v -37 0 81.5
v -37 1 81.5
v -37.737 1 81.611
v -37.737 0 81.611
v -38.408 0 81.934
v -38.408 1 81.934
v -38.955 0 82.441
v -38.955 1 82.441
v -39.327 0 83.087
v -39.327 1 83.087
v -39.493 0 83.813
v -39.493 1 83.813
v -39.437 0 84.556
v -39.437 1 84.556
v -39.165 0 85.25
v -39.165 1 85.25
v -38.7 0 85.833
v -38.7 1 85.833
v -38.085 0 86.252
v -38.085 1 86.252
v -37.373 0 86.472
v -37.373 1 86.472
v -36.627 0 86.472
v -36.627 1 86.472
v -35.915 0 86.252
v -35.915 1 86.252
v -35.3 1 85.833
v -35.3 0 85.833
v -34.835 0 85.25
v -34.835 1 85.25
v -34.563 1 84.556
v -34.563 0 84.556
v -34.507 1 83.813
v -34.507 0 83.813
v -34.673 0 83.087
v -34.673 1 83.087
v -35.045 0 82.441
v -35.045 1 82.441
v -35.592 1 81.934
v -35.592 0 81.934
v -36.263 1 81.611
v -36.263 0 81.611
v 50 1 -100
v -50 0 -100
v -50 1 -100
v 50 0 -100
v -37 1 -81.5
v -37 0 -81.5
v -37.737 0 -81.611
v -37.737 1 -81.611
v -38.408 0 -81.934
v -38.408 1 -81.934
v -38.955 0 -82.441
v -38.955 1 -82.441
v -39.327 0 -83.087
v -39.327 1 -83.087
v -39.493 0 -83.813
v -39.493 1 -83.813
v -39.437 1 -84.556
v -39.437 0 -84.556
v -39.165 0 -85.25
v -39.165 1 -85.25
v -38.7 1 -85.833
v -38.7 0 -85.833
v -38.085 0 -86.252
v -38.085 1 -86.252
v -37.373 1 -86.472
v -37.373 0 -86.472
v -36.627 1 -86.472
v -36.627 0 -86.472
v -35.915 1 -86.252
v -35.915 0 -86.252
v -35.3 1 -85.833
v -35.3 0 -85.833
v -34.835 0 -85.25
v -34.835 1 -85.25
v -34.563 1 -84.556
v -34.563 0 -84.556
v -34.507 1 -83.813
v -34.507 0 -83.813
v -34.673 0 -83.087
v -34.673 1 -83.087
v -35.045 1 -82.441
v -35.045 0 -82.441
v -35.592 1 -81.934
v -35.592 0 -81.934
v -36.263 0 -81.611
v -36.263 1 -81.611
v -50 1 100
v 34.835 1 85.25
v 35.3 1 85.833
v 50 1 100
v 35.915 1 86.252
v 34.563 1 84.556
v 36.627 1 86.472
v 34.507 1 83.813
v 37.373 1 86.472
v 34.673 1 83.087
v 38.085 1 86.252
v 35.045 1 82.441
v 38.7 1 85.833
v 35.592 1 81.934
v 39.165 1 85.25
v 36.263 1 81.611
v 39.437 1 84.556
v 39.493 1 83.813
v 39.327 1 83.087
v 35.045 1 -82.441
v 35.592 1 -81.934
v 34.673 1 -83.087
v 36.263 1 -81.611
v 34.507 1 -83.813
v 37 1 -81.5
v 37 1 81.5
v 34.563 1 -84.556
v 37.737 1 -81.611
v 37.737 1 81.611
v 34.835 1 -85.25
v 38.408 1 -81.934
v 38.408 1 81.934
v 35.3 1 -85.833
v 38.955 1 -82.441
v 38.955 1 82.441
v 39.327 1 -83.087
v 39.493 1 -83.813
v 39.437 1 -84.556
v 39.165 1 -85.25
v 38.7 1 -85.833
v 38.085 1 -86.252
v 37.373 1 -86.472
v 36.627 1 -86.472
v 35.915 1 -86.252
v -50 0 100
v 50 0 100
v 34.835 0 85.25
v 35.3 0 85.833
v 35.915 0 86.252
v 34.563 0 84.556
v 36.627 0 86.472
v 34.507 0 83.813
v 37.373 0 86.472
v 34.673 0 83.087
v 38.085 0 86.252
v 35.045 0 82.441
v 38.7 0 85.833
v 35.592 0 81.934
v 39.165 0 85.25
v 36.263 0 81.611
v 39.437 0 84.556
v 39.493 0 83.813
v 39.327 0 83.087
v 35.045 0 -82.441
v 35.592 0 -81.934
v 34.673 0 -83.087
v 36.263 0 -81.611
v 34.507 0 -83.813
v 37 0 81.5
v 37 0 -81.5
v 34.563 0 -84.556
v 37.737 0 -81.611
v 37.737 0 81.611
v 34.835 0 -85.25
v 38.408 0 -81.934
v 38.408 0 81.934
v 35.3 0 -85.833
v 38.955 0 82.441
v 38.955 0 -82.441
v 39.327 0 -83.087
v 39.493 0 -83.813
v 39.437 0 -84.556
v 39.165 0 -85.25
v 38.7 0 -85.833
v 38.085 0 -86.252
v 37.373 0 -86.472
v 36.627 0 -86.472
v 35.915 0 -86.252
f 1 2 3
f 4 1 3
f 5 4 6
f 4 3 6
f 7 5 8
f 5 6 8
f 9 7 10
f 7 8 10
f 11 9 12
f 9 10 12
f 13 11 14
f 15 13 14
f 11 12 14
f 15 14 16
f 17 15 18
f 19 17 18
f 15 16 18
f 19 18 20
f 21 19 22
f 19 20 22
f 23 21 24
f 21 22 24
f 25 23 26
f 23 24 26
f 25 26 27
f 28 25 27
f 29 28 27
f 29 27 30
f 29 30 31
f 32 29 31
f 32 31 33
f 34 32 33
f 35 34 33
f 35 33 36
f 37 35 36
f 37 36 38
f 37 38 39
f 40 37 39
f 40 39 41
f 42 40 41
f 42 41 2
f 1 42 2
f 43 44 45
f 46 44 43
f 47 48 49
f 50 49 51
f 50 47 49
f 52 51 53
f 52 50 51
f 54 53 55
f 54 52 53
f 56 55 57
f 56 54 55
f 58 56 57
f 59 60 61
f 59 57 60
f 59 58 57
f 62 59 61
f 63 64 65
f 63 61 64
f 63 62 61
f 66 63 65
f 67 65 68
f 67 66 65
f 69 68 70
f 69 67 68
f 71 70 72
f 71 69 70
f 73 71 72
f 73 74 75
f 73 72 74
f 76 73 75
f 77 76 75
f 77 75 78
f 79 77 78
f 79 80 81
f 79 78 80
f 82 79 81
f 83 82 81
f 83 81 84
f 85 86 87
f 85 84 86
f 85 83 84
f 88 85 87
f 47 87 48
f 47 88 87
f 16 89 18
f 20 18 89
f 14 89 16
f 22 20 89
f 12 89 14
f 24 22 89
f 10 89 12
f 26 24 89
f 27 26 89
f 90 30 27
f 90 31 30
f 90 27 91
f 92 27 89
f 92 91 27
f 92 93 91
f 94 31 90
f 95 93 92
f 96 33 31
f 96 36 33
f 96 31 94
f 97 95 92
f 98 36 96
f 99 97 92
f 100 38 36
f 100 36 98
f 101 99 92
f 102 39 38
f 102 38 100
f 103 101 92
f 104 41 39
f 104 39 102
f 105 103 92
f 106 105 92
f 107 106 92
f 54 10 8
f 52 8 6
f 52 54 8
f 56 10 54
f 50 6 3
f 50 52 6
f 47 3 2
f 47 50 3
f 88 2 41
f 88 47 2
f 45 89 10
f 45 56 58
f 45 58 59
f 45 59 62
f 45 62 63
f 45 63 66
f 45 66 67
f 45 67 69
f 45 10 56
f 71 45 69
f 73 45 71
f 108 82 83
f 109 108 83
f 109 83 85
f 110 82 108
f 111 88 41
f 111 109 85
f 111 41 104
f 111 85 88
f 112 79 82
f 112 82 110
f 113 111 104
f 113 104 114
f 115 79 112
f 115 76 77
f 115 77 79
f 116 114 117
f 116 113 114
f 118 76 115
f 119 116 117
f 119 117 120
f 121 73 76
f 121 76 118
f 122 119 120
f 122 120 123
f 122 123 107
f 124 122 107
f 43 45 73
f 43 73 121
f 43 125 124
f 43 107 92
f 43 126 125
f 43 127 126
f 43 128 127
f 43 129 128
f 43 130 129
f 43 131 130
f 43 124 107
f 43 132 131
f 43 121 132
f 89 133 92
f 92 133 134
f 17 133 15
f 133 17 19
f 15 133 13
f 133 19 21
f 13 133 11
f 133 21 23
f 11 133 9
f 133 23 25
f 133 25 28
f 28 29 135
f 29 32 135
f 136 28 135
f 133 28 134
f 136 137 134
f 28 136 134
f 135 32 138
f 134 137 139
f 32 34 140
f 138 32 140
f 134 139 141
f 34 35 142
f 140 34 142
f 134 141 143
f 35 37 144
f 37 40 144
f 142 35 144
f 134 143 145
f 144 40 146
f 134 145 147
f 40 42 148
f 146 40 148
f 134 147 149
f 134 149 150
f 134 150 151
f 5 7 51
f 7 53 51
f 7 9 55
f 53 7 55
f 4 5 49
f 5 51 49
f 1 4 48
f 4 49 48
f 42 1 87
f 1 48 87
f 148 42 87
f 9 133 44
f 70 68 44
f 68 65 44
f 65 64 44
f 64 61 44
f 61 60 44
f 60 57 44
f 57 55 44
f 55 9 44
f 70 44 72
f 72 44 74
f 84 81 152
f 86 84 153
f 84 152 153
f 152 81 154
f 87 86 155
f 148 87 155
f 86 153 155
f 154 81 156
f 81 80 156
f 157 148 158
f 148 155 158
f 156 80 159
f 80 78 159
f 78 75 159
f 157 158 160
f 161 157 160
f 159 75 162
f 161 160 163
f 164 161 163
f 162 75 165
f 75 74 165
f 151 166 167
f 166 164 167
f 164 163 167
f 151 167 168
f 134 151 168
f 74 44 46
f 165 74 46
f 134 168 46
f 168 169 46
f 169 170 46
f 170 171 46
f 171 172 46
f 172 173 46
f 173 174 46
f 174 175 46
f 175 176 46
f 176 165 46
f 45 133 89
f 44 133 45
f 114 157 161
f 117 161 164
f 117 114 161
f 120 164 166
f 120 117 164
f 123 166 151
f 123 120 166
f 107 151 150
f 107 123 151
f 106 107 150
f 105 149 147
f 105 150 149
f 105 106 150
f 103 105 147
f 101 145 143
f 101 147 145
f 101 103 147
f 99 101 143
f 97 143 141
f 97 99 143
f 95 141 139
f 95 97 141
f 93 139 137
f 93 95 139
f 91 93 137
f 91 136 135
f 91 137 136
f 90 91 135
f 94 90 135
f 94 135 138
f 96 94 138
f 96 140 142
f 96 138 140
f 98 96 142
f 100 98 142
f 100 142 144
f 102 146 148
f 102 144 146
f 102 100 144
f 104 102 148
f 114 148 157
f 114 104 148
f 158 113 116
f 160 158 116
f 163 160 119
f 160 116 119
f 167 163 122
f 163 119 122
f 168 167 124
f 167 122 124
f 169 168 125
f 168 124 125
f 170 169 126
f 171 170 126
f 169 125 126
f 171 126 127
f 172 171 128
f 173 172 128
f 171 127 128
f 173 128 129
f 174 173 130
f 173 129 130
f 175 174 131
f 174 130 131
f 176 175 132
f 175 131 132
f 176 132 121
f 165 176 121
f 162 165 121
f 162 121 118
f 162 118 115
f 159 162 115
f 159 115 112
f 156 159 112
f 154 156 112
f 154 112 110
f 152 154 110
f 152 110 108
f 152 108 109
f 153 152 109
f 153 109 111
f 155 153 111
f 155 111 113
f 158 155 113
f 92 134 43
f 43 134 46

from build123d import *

# Parameters (mm, degrees)
SKETCH1_W               = 100
SKETCH1_H               = 200
BOSS_EXTRUDE1_DEPTH     = 1
SKETCH3_R               = 2.5
CUT_EXTRUDE1_DEPTH      = 112.807870922
MIRROR2_COPY_1_SKETCH_R = 2.5
MIRROR2_COPY_1_DEPTH    = 112.807870922


with BuildPart() as part:
    # Sketch1 → Boss-Extrude1 (new body)
    with BuildSketch(Plane(origin=(0, 0, 0), x_dir=(1, 0, 0), z_dir=(0, 1, 0))):
        Rectangle(SKETCH1_W, SKETCH1_H)
    extrude(amount=BOSS_EXTRUDE1_DEPTH)

    # Sketch3 → Cut-Extrude1 (cut, through all)
    with BuildSketch(Plane(origin=(0, 1, 0), x_dir=(1, 0, 0), z_dir=(0, 1, 0))):
        with Locations(Location((37, 84, 0), (0, 0, 270))):
            Circle(SKETCH3_R)
    cut_extrude1 = extrude(amount=-CUT_EXTRUDE1_DEPTH, mode=Mode.SUBTRACT)

    # Mirror1: Cut-Extrude1 across plane
    add(cut_extrude1.mirror(Plane(origin=(0, 0, 0), x_dir=(0, 0, 1), z_dir=(1, 0, 0))), mode=Mode.SUBTRACT)

    # Mirror2: Cut-Extrude1 across plane
    add(cut_extrude1.mirror(Plane.XY), mode=Mode.SUBTRACT)

    # Mirror2 copy 1 sketch → Mirror2 copy 1 (cut, through all)
    with BuildSketch(Plane(origin=(0, 1, 0), x_dir=(-1, 0, 0), z_dir=(0, 1, 0))):
        with Locations(Location((37, 84, 0), (0, 0, 270))):
            Circle(MIRROR2_COPY_1_SKETCH_R)
    extrude(amount=-MIRROR2_COPY_1_DEPTH, mode=Mode.SUBTRACT)


solid = part.part
